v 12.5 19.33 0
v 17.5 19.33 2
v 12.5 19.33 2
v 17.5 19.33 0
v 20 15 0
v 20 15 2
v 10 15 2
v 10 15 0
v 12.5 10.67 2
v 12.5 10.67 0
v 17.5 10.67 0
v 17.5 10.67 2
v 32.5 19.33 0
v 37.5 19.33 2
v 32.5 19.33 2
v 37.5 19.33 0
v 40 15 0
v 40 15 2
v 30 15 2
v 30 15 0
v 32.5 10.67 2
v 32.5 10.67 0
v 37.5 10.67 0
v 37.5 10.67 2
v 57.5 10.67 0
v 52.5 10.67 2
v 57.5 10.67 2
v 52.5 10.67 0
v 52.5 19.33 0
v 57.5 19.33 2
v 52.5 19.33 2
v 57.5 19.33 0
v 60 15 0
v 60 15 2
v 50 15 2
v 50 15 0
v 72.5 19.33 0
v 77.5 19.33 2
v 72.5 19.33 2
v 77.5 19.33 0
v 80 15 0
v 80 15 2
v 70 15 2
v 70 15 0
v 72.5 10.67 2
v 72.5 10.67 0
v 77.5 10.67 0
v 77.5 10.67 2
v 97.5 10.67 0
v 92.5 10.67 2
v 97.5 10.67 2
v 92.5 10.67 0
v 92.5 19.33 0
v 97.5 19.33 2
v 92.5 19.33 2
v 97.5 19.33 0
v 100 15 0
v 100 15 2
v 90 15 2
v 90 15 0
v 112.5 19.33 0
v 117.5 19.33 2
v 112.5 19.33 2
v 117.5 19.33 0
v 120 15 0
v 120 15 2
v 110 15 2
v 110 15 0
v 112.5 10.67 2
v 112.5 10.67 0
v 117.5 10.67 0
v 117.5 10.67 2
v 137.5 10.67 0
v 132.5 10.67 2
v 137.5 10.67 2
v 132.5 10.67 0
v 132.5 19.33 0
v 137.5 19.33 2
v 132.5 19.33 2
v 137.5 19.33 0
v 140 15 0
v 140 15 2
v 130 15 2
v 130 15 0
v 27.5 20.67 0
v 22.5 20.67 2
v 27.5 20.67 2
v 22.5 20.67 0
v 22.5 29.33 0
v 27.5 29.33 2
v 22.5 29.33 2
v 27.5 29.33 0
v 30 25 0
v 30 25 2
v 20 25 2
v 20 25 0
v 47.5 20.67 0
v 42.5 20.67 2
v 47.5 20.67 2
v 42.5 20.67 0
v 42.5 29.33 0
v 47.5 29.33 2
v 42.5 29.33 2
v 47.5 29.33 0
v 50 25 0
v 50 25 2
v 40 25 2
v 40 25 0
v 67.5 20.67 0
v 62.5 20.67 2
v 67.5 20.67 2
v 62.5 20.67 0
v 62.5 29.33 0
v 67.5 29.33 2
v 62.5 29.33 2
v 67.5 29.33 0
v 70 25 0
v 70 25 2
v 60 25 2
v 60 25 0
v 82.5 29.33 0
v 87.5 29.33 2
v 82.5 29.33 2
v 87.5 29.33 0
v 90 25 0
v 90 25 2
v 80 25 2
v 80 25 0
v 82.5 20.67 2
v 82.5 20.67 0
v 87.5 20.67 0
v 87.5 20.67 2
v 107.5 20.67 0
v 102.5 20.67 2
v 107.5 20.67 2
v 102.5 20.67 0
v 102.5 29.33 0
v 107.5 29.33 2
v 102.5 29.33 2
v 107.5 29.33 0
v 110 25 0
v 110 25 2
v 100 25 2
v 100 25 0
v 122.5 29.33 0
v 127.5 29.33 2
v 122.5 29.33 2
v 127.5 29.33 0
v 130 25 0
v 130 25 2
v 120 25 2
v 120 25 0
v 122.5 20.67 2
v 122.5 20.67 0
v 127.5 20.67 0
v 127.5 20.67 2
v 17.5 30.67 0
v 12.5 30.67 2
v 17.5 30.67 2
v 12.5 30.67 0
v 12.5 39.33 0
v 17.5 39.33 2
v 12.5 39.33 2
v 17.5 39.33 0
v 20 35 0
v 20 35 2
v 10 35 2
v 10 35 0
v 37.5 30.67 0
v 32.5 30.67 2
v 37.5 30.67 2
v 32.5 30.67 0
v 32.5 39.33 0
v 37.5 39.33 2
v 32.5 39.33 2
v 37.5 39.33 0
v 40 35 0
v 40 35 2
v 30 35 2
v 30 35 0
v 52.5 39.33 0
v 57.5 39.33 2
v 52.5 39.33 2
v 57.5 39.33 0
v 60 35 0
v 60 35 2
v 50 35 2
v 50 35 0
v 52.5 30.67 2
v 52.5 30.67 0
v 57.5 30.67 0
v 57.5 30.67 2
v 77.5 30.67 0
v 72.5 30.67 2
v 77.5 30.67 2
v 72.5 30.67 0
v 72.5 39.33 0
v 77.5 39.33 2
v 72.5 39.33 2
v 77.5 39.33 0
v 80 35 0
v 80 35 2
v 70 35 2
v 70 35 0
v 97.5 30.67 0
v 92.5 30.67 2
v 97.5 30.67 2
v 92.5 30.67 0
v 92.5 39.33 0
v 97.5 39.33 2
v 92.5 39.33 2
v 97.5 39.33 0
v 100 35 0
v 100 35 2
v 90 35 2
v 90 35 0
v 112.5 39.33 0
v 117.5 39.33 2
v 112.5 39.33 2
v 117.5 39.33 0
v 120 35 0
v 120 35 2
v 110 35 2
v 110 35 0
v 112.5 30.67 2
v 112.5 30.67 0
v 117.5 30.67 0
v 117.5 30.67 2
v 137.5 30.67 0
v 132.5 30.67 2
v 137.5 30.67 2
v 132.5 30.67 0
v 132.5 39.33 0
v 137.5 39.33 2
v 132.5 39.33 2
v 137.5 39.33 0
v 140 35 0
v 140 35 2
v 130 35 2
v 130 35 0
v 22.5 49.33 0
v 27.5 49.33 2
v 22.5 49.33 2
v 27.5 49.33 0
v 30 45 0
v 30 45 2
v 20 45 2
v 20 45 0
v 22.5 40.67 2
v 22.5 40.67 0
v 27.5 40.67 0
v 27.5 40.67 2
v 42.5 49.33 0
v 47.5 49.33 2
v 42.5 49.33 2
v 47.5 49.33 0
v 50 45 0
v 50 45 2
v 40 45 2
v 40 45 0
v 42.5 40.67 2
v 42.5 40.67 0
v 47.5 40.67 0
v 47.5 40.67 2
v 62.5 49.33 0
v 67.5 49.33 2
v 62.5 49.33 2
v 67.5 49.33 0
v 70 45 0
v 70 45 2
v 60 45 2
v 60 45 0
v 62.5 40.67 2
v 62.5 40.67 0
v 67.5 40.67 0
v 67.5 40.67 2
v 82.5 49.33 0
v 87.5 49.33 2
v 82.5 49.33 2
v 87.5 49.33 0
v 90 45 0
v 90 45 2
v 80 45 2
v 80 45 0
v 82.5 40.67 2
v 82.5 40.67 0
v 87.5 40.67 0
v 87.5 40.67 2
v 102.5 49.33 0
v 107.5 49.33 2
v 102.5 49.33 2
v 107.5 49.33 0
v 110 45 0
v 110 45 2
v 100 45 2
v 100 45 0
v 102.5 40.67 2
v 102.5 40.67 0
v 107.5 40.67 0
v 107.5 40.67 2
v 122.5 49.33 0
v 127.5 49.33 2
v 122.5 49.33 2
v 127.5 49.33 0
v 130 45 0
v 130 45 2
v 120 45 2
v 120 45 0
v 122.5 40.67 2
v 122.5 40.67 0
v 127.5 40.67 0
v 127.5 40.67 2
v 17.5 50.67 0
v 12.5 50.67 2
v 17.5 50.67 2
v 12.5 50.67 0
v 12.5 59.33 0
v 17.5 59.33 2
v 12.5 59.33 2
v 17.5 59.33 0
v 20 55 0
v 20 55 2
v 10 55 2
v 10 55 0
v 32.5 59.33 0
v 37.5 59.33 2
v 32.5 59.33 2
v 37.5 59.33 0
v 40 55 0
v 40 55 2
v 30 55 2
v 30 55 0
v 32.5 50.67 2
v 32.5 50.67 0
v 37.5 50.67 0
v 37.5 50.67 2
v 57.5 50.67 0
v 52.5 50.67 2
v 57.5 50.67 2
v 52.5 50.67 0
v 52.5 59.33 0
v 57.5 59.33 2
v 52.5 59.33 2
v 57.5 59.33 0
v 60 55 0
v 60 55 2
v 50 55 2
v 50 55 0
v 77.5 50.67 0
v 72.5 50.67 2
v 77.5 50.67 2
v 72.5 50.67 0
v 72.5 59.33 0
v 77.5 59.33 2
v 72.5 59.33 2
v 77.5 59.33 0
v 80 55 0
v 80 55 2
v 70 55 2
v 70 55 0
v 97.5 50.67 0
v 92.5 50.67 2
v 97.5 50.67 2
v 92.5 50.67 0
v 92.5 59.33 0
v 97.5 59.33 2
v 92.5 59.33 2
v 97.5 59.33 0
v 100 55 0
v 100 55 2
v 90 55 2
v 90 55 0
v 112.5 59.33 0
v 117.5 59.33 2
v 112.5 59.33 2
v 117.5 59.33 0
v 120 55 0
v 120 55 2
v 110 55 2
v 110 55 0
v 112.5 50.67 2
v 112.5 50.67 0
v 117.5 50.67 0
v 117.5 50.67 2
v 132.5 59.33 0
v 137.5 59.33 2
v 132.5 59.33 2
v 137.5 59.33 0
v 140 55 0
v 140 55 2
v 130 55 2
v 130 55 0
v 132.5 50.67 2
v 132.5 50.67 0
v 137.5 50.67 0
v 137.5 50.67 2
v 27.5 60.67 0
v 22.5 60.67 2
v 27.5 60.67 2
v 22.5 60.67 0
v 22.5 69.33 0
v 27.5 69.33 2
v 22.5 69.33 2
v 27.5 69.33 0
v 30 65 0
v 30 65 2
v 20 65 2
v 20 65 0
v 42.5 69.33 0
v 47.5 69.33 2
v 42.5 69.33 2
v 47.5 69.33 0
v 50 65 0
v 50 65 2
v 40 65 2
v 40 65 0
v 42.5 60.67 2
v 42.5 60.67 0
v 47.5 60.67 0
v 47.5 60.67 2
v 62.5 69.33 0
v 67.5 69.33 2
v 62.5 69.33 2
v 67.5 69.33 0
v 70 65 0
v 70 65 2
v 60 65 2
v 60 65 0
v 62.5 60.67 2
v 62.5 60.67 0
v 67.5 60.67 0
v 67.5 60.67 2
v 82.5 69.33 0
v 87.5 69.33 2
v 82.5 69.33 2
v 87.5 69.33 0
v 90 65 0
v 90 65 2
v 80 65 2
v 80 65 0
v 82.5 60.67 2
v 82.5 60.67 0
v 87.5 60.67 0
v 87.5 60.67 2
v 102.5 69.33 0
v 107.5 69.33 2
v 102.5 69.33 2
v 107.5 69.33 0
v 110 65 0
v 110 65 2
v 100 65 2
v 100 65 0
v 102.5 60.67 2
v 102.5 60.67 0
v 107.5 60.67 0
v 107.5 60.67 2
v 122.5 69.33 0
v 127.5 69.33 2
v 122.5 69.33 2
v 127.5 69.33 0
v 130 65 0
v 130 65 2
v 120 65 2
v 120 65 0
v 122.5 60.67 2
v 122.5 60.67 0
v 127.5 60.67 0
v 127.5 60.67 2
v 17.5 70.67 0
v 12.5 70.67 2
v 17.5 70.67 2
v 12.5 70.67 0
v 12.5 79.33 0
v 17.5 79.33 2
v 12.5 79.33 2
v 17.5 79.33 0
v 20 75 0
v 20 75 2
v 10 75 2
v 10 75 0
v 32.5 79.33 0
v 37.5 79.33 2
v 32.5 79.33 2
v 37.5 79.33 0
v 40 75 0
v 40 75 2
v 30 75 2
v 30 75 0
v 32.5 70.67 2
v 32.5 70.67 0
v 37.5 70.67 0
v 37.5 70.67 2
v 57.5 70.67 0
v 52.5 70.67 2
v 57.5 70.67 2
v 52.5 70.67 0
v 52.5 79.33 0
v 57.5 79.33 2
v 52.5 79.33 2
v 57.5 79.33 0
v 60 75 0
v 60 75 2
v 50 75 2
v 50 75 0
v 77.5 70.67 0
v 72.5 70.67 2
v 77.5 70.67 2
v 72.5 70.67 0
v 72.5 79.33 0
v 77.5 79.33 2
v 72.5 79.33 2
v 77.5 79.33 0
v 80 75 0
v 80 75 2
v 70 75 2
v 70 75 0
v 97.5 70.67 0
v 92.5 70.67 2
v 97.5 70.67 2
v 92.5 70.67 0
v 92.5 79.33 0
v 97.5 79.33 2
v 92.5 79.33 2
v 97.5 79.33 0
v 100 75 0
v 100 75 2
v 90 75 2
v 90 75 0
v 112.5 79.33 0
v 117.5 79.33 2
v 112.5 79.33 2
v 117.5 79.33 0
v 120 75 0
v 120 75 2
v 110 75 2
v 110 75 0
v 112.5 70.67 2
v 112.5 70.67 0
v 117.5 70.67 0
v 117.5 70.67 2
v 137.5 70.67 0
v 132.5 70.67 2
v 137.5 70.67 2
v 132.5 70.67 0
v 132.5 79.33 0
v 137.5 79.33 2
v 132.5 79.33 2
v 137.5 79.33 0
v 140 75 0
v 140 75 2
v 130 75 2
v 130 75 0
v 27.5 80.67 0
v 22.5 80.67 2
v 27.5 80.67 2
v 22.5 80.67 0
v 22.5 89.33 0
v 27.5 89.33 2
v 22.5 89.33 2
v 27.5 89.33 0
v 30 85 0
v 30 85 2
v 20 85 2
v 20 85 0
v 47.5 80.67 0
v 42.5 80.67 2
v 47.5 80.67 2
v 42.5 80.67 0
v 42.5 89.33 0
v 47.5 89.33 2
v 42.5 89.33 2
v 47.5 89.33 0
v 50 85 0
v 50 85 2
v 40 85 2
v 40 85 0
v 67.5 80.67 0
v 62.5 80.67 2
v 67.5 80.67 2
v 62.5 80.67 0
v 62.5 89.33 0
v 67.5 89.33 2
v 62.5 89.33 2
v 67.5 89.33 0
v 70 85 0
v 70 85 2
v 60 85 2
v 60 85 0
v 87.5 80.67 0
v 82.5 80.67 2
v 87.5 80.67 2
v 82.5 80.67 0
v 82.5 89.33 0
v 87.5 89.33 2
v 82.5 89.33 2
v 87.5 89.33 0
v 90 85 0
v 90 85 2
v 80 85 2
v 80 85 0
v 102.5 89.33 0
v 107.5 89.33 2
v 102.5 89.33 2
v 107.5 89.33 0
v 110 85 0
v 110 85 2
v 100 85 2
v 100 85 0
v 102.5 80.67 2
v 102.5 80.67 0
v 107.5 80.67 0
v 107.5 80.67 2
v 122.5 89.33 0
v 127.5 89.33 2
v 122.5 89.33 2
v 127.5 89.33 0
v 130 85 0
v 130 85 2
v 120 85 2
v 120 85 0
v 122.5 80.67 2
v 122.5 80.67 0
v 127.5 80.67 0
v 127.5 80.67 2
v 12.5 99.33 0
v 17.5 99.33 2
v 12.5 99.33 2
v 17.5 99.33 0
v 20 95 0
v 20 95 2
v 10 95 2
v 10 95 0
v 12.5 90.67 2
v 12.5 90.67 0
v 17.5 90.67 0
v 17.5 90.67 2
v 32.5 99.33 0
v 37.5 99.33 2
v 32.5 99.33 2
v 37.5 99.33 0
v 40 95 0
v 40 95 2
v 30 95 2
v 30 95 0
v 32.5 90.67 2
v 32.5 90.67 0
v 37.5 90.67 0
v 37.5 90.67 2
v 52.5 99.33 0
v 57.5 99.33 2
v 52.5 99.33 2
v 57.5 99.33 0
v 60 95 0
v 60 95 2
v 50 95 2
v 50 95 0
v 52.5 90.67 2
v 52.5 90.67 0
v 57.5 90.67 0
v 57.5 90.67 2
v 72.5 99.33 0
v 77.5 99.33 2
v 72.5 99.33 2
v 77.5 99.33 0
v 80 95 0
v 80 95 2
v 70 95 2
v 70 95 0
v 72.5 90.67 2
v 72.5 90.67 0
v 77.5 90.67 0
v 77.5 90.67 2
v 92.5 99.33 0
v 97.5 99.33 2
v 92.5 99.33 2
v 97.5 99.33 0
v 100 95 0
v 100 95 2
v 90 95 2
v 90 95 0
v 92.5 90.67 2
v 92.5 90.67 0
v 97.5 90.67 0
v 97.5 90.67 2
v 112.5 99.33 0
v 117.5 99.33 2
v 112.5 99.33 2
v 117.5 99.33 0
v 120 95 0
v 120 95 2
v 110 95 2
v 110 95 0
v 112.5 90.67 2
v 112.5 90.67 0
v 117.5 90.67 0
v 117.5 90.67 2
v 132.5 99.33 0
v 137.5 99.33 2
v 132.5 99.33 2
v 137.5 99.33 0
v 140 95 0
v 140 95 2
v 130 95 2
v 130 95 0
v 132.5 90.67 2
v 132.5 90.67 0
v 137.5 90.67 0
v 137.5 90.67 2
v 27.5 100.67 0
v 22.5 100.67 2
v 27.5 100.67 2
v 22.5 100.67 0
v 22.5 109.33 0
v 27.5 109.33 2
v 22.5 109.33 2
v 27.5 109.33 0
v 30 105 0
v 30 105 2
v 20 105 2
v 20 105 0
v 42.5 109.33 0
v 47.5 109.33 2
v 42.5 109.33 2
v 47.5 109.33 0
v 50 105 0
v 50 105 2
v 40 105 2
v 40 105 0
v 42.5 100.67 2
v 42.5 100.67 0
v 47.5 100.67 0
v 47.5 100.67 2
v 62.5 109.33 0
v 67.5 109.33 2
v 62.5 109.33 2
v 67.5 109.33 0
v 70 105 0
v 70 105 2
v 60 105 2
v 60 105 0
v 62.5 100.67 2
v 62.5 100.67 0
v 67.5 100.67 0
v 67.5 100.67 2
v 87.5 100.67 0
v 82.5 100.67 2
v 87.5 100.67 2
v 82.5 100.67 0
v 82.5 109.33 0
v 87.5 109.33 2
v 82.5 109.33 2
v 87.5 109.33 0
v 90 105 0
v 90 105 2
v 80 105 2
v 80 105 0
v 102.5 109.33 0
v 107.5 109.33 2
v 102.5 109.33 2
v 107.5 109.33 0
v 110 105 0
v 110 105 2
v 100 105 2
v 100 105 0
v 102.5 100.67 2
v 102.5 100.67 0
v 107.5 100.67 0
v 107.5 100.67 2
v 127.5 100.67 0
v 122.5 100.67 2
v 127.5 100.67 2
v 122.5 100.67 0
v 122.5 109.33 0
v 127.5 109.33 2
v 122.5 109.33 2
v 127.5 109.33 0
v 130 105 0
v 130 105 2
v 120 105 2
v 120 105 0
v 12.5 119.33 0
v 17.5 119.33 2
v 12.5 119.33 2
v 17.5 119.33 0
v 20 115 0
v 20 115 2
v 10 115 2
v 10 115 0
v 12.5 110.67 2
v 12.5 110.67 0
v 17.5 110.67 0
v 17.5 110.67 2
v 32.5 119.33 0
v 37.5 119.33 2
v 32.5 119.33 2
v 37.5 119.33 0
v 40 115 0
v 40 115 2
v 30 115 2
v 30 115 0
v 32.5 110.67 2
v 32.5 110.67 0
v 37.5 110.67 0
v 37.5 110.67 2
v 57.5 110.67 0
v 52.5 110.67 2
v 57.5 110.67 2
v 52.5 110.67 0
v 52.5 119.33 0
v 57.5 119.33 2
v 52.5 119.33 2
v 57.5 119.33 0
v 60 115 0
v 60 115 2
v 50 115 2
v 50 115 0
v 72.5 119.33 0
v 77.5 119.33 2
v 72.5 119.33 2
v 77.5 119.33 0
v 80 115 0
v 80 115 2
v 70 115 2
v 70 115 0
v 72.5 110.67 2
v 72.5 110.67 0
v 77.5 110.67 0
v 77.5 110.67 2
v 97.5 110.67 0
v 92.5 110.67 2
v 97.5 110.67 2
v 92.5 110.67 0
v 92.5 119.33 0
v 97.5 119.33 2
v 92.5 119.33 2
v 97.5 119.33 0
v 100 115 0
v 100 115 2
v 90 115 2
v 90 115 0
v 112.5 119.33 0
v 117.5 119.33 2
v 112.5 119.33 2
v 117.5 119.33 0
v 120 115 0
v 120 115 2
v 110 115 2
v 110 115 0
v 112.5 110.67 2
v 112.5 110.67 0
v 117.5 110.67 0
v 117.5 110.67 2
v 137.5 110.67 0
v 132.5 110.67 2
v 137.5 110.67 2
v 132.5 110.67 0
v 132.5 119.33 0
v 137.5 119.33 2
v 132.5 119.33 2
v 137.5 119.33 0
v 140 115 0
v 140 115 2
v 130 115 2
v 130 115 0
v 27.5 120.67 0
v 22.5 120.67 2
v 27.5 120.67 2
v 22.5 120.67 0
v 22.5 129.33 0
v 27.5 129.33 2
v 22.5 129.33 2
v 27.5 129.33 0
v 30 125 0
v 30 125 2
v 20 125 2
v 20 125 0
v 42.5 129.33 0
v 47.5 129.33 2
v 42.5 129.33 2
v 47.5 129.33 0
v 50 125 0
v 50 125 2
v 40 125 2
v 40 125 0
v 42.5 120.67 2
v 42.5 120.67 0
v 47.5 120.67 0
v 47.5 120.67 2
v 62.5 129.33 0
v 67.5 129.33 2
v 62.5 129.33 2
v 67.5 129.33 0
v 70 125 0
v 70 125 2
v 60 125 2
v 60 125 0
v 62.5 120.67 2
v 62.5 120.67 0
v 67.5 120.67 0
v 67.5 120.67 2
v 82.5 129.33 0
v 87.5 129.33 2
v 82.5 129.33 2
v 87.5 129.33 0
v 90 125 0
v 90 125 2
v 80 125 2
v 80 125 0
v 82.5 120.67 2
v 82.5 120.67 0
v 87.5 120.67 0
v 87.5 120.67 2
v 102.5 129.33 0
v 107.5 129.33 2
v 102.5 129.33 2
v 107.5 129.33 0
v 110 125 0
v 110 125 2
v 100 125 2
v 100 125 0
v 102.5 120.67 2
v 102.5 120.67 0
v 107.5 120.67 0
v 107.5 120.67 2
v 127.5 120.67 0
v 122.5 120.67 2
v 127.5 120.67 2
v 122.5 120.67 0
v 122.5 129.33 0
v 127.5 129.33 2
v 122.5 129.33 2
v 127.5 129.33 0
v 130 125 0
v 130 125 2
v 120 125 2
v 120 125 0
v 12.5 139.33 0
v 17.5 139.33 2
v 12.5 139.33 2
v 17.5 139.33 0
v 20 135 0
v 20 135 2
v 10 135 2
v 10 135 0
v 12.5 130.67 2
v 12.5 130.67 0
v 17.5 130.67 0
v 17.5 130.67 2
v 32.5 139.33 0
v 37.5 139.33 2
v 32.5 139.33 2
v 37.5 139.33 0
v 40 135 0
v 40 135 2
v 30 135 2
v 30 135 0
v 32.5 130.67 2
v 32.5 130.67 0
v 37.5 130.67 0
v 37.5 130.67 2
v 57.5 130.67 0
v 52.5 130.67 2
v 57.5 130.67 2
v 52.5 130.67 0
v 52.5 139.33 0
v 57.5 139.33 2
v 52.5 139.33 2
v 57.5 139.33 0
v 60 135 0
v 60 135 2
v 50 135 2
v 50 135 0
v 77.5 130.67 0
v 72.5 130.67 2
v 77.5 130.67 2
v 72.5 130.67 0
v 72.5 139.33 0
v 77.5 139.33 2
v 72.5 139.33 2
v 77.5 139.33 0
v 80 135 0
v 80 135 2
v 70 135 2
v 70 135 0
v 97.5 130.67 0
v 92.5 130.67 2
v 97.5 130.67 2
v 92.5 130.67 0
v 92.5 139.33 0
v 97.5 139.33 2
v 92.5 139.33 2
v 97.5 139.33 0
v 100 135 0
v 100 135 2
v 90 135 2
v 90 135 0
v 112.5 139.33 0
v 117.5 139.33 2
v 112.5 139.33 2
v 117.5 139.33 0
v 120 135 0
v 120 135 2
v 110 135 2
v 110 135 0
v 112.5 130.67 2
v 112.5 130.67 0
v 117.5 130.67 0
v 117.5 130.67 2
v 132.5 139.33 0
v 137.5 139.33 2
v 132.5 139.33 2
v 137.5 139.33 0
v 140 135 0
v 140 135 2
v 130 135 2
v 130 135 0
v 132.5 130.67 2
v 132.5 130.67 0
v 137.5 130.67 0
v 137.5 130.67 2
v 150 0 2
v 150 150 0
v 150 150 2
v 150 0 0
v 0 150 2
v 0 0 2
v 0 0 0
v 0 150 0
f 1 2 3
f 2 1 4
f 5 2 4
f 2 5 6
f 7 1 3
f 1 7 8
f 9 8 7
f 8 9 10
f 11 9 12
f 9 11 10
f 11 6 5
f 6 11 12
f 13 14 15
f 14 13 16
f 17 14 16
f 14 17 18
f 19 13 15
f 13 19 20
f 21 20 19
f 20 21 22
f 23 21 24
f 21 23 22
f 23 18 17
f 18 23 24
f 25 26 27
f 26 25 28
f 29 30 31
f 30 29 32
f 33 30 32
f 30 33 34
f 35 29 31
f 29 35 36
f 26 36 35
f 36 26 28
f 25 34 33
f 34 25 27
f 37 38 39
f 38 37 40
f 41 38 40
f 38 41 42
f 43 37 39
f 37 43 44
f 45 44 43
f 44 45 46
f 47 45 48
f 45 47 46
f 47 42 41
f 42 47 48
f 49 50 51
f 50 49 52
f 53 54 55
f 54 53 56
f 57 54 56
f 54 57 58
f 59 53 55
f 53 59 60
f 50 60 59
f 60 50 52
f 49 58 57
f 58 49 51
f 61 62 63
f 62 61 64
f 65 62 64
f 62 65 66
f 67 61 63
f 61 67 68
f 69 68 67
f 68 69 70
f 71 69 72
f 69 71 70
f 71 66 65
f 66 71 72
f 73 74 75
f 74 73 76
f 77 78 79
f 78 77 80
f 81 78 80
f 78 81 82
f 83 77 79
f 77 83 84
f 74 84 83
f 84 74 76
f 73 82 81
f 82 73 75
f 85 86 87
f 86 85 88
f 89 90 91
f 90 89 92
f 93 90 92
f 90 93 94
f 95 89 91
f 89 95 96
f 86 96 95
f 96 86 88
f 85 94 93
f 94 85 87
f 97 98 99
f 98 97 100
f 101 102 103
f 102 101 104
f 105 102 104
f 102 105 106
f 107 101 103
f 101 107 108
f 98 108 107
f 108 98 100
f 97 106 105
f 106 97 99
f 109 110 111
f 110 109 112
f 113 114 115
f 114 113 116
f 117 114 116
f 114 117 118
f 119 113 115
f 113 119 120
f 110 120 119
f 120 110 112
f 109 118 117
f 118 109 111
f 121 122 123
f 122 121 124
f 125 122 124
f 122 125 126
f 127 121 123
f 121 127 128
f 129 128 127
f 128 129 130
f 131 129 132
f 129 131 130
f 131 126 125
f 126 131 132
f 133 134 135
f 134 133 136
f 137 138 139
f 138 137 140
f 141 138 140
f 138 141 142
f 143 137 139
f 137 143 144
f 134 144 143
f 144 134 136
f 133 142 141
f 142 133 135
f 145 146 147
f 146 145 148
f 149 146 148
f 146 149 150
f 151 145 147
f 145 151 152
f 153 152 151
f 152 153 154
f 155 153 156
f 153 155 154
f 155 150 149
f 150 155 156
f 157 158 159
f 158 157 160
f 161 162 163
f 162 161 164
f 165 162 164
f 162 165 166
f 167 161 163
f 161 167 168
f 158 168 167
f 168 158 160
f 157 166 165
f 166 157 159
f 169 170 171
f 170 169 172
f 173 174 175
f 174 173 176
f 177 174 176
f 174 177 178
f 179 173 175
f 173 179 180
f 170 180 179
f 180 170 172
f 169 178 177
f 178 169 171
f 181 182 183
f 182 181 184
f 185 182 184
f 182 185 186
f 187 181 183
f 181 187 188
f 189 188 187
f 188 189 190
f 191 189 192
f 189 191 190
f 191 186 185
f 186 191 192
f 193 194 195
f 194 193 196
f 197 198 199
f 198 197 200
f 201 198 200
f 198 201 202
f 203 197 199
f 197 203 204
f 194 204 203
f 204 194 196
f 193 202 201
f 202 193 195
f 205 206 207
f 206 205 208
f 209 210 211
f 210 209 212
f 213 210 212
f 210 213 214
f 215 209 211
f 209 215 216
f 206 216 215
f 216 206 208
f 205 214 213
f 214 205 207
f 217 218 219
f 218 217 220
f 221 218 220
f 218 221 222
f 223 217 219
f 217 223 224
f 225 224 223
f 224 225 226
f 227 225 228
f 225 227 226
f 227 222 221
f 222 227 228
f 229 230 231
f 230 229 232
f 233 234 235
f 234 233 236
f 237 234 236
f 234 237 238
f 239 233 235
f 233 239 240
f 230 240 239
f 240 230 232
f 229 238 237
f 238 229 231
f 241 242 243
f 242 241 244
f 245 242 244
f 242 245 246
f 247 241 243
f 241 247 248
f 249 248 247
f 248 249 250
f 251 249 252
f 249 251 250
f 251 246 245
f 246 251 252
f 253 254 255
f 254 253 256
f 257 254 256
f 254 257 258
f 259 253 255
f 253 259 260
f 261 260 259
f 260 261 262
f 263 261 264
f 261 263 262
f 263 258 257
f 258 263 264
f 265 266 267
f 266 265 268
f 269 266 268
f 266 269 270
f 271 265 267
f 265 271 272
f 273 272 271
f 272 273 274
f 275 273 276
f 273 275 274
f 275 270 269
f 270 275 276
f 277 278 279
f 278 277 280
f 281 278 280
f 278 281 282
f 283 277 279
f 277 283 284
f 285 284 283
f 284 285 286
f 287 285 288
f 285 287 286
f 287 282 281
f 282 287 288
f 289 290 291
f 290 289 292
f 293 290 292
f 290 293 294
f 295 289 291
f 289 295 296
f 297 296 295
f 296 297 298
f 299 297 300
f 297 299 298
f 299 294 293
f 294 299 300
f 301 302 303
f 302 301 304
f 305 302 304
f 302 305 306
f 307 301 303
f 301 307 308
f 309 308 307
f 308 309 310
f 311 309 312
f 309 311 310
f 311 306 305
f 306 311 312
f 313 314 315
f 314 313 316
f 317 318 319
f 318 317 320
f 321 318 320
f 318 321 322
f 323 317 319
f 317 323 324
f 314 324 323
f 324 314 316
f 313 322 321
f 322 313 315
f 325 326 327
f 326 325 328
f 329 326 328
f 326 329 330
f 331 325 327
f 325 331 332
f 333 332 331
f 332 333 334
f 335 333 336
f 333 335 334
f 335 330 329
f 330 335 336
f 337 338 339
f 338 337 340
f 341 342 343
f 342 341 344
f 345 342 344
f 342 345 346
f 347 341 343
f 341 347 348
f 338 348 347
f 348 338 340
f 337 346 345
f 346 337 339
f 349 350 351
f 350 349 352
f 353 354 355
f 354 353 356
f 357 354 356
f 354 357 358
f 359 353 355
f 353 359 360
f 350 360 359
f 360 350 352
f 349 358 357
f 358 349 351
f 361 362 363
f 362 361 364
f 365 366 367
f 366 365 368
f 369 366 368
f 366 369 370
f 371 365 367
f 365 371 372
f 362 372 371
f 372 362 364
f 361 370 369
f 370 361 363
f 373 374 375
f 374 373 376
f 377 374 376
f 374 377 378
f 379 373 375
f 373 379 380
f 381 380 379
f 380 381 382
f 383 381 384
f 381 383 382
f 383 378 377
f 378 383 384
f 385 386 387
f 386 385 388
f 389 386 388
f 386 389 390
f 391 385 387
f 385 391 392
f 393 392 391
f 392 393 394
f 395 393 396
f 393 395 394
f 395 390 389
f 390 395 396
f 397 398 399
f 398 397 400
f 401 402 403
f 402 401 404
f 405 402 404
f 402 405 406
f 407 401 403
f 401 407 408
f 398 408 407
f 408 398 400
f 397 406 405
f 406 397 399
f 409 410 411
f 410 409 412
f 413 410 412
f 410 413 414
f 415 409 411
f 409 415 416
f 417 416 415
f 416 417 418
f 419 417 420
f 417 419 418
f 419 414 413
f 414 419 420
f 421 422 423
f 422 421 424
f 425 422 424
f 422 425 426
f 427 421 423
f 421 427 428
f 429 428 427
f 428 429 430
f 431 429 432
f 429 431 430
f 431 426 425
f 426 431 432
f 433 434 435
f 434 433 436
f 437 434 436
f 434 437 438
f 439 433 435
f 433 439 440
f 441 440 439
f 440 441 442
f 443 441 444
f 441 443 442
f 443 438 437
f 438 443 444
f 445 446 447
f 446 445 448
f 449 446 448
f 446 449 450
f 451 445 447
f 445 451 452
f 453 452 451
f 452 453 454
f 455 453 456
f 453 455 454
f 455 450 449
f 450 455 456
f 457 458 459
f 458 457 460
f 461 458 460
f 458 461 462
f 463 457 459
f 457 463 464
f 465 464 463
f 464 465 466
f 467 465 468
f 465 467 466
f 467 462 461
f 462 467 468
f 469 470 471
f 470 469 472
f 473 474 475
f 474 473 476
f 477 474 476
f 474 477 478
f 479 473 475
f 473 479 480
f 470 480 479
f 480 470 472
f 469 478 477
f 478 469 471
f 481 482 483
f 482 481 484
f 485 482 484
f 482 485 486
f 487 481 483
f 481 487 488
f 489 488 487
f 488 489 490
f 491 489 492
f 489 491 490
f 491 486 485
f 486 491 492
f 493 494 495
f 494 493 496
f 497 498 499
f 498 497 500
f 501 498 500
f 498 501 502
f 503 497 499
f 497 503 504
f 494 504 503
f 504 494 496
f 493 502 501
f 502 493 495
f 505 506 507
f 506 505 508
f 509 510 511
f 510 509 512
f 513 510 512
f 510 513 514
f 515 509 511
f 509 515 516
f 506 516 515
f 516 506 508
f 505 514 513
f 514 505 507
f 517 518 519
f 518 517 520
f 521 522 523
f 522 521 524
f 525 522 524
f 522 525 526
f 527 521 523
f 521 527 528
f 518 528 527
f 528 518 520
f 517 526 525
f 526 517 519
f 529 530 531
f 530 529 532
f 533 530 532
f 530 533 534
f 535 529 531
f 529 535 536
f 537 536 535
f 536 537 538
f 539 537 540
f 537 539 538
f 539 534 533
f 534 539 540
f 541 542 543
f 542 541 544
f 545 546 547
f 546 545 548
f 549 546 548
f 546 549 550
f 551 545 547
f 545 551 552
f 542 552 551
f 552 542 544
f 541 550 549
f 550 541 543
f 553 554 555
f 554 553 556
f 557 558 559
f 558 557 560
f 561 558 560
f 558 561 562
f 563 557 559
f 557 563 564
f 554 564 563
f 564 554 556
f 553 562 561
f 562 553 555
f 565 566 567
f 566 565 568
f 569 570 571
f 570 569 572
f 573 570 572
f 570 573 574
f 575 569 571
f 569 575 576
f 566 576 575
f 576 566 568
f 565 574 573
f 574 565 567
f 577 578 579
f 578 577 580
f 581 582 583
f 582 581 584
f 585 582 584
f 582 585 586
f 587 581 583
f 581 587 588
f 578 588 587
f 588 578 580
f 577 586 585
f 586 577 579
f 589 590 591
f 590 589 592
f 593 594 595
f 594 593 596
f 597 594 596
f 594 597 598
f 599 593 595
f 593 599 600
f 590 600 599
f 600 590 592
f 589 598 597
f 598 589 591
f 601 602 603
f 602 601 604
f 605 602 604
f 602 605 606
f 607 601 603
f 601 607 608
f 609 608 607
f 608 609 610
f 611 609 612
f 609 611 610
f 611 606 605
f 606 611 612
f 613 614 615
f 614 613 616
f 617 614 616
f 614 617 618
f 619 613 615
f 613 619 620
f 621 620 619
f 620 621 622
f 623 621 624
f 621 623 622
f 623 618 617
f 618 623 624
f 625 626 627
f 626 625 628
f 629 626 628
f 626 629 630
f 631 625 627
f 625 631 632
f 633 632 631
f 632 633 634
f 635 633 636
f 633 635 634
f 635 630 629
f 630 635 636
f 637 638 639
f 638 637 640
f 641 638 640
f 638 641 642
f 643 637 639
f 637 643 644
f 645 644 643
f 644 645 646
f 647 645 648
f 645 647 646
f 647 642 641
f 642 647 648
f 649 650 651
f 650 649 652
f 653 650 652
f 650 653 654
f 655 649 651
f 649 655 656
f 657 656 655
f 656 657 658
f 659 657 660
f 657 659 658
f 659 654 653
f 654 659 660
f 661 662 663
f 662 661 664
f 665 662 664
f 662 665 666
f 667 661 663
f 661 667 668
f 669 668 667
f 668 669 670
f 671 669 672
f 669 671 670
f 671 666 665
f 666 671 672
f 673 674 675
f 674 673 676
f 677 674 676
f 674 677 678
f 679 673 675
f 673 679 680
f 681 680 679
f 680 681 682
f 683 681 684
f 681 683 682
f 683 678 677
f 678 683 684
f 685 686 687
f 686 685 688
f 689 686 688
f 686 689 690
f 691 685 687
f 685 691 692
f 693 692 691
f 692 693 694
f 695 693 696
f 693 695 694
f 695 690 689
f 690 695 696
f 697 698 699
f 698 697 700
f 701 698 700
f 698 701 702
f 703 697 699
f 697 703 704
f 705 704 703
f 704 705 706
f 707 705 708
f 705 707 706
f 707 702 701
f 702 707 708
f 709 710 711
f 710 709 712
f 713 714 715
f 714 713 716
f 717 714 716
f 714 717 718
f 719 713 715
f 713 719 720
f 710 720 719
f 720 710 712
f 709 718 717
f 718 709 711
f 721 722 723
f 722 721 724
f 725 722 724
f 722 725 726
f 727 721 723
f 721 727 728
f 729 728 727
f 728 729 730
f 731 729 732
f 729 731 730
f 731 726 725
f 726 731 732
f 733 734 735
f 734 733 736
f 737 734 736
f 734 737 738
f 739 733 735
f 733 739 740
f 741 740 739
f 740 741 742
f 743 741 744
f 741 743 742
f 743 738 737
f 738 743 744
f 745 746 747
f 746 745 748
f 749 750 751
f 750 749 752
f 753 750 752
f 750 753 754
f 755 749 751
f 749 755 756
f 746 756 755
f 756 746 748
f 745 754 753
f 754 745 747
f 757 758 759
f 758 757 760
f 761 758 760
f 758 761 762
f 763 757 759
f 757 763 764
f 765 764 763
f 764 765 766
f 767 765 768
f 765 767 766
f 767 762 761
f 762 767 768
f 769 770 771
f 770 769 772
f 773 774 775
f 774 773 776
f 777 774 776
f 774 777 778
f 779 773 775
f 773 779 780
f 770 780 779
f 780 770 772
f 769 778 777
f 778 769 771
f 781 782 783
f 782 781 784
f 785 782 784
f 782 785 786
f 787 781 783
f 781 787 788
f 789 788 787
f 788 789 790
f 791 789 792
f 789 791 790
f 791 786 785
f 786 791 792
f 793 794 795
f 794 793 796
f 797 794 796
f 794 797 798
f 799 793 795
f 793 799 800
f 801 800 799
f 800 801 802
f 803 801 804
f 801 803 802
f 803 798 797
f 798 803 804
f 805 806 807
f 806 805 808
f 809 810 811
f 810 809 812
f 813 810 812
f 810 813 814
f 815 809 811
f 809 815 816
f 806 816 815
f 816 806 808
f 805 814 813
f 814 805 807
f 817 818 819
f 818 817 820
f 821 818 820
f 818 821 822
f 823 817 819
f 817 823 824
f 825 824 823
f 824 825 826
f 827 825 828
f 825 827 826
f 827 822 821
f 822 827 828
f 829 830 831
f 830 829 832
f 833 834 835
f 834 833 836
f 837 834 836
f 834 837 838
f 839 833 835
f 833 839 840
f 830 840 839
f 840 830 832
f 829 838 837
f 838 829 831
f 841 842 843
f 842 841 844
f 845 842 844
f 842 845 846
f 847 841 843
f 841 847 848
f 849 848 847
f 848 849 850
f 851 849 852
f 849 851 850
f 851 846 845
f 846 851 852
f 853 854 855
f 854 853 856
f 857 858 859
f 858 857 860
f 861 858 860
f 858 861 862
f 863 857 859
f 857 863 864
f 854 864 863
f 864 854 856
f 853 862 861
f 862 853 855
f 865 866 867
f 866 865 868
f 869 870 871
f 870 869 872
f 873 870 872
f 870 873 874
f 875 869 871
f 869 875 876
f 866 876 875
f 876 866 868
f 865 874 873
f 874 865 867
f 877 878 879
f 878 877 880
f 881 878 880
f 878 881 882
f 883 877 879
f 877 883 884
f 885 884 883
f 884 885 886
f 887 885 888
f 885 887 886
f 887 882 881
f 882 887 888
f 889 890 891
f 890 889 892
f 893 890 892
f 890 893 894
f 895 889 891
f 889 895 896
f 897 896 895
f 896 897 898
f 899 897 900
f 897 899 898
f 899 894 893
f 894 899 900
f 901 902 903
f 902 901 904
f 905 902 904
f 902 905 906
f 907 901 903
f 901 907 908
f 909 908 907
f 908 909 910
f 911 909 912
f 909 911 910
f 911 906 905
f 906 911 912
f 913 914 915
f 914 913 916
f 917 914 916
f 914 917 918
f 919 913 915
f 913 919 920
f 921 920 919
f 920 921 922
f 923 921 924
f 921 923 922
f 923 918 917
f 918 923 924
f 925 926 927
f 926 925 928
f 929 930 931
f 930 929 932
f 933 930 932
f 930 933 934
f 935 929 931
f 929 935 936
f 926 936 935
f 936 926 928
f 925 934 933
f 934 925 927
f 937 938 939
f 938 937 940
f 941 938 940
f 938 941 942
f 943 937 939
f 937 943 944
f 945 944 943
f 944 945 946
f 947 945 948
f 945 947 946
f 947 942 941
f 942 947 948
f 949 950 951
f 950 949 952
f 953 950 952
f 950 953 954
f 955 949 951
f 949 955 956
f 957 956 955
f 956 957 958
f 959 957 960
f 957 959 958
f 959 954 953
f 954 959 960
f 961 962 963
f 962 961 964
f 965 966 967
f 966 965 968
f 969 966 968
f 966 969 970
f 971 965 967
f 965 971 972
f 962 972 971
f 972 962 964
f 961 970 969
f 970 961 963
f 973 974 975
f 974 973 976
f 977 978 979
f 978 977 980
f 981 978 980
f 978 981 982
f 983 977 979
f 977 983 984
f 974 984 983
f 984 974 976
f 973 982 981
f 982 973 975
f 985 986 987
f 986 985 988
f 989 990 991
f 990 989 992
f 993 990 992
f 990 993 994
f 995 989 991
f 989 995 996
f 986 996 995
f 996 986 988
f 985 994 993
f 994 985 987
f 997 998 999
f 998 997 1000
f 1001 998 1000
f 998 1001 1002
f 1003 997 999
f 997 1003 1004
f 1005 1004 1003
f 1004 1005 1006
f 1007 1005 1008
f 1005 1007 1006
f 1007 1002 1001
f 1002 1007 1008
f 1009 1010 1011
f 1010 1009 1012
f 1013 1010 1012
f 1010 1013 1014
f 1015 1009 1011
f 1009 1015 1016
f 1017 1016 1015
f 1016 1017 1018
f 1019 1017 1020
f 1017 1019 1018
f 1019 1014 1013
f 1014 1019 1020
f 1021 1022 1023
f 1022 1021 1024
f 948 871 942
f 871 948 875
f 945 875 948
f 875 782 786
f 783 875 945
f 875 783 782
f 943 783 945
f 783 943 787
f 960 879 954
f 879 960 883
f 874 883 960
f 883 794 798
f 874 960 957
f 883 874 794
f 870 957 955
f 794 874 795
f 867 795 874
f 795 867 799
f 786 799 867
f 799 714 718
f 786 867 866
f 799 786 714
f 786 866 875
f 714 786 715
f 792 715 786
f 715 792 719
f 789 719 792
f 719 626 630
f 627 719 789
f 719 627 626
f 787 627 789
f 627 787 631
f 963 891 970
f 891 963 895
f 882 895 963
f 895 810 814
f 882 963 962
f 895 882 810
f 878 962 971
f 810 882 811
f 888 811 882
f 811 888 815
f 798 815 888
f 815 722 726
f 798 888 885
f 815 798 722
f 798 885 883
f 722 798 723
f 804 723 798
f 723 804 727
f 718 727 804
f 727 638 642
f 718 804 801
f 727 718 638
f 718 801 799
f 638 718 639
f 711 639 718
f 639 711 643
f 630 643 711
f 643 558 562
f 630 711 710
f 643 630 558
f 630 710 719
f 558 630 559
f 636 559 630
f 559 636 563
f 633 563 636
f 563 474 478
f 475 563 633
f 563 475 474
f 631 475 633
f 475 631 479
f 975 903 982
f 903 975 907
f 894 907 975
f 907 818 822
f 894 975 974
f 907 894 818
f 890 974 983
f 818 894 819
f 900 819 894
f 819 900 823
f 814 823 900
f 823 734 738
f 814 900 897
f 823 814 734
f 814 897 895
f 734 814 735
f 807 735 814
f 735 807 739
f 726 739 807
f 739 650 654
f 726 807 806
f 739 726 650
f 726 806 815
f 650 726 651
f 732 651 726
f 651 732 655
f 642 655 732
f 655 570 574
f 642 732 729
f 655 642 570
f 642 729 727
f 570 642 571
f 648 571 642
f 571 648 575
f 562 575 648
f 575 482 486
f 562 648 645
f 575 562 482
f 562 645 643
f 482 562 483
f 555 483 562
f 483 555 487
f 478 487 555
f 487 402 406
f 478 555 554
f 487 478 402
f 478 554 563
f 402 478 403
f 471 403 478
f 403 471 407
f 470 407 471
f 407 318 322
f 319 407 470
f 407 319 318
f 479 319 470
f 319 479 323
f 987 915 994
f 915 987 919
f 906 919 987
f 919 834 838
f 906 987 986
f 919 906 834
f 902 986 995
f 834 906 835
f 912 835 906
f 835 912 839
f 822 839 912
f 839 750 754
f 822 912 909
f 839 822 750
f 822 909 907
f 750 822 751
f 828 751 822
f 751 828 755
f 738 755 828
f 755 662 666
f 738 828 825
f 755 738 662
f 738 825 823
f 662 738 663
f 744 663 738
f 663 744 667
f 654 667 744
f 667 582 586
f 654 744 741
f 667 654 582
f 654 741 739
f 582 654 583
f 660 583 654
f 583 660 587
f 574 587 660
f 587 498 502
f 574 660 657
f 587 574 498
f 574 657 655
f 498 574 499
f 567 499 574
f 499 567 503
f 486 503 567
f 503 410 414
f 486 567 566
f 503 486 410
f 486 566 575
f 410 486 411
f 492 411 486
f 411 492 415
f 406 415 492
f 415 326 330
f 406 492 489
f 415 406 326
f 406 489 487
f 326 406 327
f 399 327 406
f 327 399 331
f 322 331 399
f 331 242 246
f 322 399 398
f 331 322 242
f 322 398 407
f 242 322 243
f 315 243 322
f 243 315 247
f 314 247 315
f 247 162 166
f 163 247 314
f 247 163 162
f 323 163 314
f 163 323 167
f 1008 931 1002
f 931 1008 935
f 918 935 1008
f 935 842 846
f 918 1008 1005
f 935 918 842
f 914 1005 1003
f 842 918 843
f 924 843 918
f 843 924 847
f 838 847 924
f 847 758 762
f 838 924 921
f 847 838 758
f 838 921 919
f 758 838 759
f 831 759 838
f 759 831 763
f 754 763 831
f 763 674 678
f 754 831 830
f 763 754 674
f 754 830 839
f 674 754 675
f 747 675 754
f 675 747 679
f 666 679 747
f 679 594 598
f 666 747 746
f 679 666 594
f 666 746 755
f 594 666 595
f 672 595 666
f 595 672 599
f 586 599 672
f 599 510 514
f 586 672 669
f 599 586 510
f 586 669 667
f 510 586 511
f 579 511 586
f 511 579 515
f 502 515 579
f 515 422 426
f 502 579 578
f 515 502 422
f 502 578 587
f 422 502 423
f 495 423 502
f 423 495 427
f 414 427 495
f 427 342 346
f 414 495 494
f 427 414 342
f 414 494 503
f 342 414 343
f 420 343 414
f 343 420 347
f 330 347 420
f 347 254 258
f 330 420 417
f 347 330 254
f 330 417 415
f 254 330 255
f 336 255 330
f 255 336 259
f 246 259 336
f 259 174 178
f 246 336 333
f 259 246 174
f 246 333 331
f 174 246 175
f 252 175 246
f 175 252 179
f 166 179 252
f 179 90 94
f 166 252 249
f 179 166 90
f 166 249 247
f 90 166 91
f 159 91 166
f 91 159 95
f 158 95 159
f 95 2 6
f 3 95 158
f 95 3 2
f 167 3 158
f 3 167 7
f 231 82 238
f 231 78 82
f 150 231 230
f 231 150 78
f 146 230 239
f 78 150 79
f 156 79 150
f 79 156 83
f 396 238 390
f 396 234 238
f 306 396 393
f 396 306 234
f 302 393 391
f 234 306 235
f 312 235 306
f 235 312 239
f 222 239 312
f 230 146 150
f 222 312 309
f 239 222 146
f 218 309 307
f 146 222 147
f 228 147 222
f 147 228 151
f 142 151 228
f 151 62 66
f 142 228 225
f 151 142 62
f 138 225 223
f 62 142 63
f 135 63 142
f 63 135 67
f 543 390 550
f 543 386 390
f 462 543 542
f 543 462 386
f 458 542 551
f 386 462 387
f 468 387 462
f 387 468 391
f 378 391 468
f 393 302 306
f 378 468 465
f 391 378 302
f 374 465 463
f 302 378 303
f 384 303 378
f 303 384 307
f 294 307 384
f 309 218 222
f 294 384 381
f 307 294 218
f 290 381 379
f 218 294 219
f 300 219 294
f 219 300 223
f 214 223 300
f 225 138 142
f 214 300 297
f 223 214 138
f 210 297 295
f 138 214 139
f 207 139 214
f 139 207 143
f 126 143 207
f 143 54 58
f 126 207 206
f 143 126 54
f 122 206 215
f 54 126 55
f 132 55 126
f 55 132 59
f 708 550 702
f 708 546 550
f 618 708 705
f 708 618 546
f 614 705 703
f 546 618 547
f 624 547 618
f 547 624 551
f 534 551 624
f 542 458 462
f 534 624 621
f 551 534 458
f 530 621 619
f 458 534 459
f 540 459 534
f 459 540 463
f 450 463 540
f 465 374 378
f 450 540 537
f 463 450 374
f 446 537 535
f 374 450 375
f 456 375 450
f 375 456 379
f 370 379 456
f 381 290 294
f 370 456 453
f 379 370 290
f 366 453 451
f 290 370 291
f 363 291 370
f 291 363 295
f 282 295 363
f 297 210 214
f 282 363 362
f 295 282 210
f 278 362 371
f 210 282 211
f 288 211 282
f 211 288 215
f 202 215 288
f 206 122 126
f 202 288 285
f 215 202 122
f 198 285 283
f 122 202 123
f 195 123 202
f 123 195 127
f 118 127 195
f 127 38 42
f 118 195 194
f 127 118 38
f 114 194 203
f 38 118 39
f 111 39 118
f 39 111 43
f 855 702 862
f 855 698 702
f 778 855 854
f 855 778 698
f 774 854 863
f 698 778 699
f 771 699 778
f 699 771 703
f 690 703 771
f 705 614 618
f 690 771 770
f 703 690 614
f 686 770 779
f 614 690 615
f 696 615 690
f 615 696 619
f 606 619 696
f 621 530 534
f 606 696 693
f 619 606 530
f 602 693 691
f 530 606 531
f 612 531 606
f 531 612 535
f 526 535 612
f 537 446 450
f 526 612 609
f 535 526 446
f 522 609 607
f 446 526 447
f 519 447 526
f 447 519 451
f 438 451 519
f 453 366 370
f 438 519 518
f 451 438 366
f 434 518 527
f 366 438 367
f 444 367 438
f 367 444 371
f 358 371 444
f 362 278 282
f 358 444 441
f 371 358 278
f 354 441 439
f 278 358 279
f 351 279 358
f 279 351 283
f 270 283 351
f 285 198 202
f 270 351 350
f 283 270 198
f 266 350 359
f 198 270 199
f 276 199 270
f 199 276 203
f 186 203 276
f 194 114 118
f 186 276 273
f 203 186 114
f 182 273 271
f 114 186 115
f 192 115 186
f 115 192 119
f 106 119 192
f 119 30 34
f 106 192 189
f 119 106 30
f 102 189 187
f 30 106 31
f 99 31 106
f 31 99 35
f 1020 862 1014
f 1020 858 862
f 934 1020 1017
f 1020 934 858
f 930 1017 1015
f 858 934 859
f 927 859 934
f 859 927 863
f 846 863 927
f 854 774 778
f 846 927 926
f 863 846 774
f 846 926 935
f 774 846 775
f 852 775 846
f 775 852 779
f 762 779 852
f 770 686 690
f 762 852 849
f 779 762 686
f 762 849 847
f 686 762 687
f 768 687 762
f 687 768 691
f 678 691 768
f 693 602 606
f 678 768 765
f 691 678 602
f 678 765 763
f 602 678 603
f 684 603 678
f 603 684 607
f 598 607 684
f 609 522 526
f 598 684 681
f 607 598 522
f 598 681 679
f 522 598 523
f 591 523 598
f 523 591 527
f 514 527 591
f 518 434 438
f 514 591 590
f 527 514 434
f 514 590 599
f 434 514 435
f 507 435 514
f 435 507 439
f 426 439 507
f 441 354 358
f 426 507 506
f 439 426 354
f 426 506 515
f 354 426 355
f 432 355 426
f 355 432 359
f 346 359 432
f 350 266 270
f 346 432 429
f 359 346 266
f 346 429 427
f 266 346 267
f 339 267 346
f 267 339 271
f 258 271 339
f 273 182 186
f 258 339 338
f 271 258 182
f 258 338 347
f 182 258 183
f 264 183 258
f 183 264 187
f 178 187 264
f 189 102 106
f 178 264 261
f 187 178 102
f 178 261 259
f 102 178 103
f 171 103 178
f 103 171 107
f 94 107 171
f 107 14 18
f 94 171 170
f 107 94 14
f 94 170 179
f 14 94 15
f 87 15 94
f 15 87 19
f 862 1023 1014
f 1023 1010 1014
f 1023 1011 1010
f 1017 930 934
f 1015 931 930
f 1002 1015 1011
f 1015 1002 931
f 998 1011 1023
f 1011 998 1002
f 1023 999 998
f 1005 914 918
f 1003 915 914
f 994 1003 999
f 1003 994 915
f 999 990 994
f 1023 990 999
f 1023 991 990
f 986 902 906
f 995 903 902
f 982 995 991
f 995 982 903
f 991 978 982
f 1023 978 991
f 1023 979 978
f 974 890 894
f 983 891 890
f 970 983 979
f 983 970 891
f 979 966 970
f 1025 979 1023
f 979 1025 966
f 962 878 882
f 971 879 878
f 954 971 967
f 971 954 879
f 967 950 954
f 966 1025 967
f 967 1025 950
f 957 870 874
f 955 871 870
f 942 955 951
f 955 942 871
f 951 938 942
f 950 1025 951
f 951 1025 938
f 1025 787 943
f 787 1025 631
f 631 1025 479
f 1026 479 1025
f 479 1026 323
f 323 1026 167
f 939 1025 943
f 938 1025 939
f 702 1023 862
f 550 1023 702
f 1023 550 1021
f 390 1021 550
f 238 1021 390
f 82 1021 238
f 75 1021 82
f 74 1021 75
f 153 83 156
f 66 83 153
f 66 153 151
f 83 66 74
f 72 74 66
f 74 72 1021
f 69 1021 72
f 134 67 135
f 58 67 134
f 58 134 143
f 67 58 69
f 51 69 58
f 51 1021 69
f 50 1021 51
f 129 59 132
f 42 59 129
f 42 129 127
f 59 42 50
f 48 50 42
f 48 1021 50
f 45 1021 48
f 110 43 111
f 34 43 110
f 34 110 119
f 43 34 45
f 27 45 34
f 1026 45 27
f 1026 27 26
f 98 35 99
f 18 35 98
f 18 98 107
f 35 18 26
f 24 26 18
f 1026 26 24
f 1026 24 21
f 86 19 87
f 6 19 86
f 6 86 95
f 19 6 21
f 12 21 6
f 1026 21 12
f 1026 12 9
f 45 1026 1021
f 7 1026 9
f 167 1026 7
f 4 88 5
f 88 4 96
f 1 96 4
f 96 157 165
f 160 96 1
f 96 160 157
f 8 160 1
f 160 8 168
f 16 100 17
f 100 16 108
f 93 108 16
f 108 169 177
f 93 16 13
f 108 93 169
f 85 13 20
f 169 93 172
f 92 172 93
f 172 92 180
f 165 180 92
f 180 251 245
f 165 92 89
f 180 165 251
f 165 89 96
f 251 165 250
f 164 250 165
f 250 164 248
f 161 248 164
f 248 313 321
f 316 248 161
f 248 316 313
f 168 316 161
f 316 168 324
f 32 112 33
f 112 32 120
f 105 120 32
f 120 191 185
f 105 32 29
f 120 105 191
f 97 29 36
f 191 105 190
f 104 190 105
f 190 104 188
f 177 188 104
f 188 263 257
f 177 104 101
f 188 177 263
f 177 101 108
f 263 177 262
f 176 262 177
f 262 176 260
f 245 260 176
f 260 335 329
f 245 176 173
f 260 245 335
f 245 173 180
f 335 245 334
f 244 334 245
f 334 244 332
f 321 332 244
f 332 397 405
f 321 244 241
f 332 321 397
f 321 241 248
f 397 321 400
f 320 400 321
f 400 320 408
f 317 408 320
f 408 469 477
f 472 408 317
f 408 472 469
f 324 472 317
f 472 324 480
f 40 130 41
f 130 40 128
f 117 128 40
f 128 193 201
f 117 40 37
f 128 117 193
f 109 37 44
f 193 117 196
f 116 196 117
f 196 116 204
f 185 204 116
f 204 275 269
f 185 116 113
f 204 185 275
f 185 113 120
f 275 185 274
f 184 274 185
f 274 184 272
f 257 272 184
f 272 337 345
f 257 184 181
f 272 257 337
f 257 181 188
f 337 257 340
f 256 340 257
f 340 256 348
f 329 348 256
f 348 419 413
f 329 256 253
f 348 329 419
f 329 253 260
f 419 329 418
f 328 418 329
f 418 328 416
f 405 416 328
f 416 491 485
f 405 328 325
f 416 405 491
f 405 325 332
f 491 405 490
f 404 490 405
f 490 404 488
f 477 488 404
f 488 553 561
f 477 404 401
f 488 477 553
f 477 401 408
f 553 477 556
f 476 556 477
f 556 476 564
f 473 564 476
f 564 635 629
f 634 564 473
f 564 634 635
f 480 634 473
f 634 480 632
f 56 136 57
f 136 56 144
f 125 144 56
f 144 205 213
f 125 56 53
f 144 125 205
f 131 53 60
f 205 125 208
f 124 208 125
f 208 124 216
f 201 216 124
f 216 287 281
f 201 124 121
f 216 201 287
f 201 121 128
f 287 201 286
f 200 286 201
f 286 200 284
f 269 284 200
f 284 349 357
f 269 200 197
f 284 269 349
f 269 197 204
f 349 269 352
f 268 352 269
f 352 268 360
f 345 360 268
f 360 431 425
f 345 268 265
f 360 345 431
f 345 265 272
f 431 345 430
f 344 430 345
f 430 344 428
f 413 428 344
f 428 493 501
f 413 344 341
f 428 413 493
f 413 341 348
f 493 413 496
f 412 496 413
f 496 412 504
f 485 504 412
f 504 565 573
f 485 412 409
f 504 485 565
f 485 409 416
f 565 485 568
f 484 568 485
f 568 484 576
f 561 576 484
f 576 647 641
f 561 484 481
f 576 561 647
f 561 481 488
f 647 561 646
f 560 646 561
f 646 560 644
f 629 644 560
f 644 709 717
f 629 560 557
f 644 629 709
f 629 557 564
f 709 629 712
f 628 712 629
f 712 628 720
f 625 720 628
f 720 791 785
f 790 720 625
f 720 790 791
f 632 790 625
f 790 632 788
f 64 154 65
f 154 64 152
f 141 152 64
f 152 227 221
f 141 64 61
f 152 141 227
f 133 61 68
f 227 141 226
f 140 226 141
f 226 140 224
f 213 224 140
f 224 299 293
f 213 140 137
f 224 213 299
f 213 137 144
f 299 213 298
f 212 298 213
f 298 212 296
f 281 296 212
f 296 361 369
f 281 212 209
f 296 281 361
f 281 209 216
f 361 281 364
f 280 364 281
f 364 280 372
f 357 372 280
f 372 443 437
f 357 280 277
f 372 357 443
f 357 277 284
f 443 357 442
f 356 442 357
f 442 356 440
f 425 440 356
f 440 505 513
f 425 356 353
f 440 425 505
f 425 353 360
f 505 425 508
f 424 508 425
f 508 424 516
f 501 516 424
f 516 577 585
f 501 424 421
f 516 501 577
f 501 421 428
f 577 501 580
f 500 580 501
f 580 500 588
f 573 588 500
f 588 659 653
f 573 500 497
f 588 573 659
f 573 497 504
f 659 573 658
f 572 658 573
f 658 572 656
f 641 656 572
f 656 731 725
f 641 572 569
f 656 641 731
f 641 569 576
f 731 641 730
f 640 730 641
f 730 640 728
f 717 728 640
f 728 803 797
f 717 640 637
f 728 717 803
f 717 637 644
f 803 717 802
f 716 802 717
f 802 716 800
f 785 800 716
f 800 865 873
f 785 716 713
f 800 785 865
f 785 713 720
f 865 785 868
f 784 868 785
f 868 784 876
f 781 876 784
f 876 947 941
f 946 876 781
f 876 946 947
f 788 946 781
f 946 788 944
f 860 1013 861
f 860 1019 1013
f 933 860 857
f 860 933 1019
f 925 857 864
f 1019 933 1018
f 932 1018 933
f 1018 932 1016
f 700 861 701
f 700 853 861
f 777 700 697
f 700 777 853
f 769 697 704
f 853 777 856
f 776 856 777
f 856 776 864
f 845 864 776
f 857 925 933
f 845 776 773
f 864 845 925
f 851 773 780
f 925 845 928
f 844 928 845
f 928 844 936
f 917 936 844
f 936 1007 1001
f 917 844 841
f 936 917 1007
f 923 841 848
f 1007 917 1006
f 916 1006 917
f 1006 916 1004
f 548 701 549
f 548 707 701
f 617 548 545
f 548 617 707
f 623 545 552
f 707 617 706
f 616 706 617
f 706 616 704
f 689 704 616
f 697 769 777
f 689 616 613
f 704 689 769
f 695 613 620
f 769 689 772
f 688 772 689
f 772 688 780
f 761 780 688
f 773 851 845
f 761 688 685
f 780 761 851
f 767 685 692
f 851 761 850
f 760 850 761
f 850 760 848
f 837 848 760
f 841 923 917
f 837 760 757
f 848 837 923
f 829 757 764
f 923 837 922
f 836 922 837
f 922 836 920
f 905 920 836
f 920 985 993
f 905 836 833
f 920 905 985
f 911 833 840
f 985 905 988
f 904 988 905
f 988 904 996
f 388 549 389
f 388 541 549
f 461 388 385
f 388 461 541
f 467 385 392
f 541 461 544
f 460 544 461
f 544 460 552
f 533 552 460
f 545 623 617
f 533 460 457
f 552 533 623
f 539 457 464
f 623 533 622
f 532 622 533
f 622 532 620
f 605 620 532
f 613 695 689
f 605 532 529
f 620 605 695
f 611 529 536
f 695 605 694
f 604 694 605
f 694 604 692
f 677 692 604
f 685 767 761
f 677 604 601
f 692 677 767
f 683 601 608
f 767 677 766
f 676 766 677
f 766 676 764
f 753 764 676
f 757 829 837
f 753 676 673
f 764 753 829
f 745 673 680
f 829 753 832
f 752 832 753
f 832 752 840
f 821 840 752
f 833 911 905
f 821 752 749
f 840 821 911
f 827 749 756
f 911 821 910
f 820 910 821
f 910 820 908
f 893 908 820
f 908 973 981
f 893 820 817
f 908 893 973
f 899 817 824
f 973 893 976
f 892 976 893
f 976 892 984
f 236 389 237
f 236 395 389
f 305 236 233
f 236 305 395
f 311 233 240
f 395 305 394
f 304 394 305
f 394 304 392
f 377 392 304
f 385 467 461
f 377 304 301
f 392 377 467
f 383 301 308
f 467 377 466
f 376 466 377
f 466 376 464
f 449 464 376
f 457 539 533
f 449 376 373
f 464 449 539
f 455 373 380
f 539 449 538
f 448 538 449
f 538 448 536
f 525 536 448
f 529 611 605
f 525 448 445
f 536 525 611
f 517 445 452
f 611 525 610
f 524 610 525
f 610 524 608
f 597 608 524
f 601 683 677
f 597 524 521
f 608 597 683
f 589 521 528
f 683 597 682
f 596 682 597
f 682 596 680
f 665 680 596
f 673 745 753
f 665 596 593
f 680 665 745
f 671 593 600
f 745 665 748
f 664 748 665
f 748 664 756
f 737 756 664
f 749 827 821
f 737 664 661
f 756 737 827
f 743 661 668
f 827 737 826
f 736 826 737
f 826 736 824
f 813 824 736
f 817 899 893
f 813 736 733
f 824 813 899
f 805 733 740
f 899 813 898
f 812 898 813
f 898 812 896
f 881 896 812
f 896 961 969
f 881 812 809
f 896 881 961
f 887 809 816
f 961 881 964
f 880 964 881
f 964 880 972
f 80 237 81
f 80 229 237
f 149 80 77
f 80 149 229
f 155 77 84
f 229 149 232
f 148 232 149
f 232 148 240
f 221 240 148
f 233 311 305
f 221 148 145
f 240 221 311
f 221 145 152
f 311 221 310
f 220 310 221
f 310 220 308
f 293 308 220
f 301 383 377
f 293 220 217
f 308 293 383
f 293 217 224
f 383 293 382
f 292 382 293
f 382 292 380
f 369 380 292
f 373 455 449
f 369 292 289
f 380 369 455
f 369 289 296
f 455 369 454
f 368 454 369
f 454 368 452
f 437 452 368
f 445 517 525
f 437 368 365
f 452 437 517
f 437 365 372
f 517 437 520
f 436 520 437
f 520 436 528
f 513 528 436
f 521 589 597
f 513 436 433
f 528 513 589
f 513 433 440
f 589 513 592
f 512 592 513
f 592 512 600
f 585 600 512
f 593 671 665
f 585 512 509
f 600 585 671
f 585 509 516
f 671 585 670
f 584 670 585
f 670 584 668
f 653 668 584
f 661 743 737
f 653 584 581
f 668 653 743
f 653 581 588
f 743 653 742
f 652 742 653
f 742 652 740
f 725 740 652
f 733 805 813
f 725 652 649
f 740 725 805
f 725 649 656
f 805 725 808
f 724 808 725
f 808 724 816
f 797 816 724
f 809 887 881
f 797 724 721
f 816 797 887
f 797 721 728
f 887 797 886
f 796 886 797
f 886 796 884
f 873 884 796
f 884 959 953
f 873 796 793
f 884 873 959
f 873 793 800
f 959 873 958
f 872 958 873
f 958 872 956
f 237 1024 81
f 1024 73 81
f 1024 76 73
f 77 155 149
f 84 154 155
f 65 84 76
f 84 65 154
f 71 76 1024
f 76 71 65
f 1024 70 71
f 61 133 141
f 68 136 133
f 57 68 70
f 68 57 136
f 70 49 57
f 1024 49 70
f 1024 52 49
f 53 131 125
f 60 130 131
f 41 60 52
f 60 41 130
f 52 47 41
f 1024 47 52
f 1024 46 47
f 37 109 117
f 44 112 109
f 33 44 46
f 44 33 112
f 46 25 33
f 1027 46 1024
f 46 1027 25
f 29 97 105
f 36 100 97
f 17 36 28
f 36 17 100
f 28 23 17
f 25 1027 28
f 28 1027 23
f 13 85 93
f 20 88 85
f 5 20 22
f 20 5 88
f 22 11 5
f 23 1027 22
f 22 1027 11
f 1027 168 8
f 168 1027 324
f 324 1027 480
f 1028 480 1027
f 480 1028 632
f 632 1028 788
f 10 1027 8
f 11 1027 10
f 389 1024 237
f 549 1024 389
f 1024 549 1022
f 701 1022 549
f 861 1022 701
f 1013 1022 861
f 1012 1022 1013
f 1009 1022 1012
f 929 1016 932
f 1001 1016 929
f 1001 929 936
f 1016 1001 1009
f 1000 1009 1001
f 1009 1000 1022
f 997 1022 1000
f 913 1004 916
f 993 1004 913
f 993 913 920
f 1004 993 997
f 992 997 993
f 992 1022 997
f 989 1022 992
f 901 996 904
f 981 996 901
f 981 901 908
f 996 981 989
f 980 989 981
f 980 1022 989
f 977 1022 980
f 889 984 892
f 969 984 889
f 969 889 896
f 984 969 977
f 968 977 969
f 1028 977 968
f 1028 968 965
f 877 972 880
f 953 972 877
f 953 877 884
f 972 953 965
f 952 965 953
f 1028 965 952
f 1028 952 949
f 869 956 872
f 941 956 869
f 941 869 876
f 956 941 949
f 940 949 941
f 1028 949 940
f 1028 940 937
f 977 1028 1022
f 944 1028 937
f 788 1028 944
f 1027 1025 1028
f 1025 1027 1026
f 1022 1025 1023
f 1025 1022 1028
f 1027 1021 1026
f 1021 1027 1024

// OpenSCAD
module hexPatternPlate() {
    module hexagon() {
        translate([5, 5, 0]) {
            cylinder(d = 10, h = 10, center = true, $fn = 6);
        }
    }
    
    module hexagonPattern(cubeSize) {
        for (i = [10 : 10 : cubeSize.x - 20]) {
            jStart = i % 20 ? 10 : 20;
            
            for (j = [jStart : 20 : cubeSize.y - 20]) {
                translate([j, i, 0]) hexagon();
            }
        }
    }
    
    difference() {
        cubeSize = [150, 150, 2];
        
        cube(cubeSize);
        hexagonPattern(cubeSize);
    }
}

hexPatternPlate();
